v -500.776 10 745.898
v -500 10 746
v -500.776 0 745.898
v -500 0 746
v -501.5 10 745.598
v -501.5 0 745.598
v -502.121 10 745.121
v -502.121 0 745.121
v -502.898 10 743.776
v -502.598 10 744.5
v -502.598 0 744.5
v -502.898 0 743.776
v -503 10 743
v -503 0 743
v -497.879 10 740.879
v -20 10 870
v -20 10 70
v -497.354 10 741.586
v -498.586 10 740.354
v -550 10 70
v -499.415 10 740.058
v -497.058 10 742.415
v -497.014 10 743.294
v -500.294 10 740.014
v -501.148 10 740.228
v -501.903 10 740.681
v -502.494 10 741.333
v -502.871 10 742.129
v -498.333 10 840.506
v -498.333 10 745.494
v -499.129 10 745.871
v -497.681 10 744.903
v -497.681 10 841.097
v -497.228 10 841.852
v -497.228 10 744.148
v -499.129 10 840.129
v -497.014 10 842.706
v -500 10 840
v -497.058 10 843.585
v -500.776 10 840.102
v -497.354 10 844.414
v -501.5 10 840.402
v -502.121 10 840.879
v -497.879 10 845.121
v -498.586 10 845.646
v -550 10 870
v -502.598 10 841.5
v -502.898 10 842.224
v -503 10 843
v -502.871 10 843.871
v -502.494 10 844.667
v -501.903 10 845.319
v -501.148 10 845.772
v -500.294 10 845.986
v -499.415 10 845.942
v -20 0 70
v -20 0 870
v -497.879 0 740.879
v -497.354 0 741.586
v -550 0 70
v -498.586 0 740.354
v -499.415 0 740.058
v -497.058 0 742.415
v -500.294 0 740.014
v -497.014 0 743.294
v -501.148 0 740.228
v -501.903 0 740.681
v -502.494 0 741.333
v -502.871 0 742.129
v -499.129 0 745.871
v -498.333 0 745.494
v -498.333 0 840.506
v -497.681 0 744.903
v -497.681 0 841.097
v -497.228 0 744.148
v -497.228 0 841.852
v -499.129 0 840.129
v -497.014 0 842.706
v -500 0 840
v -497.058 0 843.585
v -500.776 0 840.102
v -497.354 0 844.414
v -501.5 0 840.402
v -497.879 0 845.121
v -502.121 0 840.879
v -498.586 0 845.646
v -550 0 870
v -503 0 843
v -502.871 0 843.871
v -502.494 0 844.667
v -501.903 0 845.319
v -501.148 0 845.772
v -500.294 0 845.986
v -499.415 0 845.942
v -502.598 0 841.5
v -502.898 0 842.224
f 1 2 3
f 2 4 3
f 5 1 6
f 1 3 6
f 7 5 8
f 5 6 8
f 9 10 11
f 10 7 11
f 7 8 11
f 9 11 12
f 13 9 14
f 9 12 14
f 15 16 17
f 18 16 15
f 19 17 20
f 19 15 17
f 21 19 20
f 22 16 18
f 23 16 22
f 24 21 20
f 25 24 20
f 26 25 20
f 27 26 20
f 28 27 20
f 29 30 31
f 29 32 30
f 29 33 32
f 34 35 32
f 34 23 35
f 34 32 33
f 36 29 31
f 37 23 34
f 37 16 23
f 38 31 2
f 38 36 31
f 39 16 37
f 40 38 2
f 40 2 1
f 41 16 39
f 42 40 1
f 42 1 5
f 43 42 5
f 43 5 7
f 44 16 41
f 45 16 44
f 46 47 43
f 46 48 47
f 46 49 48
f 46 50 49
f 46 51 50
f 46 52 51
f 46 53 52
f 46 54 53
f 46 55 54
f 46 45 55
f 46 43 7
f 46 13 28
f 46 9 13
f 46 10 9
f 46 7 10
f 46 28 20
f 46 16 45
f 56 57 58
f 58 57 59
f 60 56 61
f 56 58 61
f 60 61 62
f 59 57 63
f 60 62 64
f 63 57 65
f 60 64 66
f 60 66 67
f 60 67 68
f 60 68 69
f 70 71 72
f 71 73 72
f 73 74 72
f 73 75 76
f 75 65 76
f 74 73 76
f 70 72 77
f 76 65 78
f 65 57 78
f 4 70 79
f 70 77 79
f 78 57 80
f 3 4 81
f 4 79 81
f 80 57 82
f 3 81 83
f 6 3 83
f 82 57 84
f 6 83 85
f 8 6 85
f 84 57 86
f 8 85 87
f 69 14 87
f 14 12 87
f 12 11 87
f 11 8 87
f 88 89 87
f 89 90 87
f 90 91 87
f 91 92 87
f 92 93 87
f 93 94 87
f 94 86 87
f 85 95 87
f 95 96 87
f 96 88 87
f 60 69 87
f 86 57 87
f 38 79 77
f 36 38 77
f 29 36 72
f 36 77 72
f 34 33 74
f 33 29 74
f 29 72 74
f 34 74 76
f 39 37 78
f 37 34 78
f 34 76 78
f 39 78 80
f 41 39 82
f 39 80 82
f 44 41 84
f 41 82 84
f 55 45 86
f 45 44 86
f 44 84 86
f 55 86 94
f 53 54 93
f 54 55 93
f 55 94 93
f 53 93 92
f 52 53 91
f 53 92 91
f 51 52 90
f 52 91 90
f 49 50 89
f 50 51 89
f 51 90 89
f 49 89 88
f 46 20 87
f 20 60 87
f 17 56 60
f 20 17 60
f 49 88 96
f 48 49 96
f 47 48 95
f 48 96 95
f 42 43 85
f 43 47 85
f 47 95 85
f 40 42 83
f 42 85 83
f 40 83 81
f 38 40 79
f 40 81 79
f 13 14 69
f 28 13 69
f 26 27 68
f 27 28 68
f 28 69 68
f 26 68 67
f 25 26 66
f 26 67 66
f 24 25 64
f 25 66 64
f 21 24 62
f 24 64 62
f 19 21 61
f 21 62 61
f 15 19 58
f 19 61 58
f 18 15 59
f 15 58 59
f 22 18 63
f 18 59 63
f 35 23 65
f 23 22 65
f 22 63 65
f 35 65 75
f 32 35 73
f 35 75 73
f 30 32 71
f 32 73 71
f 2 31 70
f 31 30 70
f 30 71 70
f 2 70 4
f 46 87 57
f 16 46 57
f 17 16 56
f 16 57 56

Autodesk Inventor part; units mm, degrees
ref_plane "YZ Plane" through (0, 0, 0) normal (1, 0, 0) x (0, 1, 0)
ref_plane "XZ Plane" through (0, 0, 0) normal (0, 1, 0) x (-1, 0, 0)
ref_plane "XY Plane" through (0, 0, 0) normal (0, 0, 1) x (1, 0, 0)
sketch "Sketch8" plane through (0, 0, 0) normal (0, 1, 0) x (-1, 0, 0)
  line L0 (0, 0) -> (10, 0)
  line L1 (0, 0) -> (0, 70)
  line L2 (0, 70) -> (20, 70)
  line L3 (20, 70) -> (550, 70)
  line L4 (550, 70) -> (550, 870)
  line L5 (550, 870) -> (20, 870)
  line L6 (20, 870) -> (20, 70)
  line L7 (550, 790) -> (20, 790) construction
  circle A0 centre (500, 843) radius 3
  line L8 (500, 843) -> (500, 743)
  circle A1 centre (500, 743) radius 3
  dimension "espesor" = 10
  dimension "d38" = 70
  dimension "d39" = 20
  dimension "ancho_m" = 530
  dimension "h_inf" = 800
  dimension "d42" = 80
  dimension "d43" = 6
  dimension "d44" = 50
  dimension "d45" = 50
  dimension "d48" = 100
  dimension "d49" = 6
extrude "Extrusion8" add sketch "Sketch8" along normal blind 10
equation "\"d39\" = 2 * espesor"
equation "\"d42\" = 0.1 * h_inf"
equation "\"d46\" = espesor"
properties part number "puerta_lavaplatos"
